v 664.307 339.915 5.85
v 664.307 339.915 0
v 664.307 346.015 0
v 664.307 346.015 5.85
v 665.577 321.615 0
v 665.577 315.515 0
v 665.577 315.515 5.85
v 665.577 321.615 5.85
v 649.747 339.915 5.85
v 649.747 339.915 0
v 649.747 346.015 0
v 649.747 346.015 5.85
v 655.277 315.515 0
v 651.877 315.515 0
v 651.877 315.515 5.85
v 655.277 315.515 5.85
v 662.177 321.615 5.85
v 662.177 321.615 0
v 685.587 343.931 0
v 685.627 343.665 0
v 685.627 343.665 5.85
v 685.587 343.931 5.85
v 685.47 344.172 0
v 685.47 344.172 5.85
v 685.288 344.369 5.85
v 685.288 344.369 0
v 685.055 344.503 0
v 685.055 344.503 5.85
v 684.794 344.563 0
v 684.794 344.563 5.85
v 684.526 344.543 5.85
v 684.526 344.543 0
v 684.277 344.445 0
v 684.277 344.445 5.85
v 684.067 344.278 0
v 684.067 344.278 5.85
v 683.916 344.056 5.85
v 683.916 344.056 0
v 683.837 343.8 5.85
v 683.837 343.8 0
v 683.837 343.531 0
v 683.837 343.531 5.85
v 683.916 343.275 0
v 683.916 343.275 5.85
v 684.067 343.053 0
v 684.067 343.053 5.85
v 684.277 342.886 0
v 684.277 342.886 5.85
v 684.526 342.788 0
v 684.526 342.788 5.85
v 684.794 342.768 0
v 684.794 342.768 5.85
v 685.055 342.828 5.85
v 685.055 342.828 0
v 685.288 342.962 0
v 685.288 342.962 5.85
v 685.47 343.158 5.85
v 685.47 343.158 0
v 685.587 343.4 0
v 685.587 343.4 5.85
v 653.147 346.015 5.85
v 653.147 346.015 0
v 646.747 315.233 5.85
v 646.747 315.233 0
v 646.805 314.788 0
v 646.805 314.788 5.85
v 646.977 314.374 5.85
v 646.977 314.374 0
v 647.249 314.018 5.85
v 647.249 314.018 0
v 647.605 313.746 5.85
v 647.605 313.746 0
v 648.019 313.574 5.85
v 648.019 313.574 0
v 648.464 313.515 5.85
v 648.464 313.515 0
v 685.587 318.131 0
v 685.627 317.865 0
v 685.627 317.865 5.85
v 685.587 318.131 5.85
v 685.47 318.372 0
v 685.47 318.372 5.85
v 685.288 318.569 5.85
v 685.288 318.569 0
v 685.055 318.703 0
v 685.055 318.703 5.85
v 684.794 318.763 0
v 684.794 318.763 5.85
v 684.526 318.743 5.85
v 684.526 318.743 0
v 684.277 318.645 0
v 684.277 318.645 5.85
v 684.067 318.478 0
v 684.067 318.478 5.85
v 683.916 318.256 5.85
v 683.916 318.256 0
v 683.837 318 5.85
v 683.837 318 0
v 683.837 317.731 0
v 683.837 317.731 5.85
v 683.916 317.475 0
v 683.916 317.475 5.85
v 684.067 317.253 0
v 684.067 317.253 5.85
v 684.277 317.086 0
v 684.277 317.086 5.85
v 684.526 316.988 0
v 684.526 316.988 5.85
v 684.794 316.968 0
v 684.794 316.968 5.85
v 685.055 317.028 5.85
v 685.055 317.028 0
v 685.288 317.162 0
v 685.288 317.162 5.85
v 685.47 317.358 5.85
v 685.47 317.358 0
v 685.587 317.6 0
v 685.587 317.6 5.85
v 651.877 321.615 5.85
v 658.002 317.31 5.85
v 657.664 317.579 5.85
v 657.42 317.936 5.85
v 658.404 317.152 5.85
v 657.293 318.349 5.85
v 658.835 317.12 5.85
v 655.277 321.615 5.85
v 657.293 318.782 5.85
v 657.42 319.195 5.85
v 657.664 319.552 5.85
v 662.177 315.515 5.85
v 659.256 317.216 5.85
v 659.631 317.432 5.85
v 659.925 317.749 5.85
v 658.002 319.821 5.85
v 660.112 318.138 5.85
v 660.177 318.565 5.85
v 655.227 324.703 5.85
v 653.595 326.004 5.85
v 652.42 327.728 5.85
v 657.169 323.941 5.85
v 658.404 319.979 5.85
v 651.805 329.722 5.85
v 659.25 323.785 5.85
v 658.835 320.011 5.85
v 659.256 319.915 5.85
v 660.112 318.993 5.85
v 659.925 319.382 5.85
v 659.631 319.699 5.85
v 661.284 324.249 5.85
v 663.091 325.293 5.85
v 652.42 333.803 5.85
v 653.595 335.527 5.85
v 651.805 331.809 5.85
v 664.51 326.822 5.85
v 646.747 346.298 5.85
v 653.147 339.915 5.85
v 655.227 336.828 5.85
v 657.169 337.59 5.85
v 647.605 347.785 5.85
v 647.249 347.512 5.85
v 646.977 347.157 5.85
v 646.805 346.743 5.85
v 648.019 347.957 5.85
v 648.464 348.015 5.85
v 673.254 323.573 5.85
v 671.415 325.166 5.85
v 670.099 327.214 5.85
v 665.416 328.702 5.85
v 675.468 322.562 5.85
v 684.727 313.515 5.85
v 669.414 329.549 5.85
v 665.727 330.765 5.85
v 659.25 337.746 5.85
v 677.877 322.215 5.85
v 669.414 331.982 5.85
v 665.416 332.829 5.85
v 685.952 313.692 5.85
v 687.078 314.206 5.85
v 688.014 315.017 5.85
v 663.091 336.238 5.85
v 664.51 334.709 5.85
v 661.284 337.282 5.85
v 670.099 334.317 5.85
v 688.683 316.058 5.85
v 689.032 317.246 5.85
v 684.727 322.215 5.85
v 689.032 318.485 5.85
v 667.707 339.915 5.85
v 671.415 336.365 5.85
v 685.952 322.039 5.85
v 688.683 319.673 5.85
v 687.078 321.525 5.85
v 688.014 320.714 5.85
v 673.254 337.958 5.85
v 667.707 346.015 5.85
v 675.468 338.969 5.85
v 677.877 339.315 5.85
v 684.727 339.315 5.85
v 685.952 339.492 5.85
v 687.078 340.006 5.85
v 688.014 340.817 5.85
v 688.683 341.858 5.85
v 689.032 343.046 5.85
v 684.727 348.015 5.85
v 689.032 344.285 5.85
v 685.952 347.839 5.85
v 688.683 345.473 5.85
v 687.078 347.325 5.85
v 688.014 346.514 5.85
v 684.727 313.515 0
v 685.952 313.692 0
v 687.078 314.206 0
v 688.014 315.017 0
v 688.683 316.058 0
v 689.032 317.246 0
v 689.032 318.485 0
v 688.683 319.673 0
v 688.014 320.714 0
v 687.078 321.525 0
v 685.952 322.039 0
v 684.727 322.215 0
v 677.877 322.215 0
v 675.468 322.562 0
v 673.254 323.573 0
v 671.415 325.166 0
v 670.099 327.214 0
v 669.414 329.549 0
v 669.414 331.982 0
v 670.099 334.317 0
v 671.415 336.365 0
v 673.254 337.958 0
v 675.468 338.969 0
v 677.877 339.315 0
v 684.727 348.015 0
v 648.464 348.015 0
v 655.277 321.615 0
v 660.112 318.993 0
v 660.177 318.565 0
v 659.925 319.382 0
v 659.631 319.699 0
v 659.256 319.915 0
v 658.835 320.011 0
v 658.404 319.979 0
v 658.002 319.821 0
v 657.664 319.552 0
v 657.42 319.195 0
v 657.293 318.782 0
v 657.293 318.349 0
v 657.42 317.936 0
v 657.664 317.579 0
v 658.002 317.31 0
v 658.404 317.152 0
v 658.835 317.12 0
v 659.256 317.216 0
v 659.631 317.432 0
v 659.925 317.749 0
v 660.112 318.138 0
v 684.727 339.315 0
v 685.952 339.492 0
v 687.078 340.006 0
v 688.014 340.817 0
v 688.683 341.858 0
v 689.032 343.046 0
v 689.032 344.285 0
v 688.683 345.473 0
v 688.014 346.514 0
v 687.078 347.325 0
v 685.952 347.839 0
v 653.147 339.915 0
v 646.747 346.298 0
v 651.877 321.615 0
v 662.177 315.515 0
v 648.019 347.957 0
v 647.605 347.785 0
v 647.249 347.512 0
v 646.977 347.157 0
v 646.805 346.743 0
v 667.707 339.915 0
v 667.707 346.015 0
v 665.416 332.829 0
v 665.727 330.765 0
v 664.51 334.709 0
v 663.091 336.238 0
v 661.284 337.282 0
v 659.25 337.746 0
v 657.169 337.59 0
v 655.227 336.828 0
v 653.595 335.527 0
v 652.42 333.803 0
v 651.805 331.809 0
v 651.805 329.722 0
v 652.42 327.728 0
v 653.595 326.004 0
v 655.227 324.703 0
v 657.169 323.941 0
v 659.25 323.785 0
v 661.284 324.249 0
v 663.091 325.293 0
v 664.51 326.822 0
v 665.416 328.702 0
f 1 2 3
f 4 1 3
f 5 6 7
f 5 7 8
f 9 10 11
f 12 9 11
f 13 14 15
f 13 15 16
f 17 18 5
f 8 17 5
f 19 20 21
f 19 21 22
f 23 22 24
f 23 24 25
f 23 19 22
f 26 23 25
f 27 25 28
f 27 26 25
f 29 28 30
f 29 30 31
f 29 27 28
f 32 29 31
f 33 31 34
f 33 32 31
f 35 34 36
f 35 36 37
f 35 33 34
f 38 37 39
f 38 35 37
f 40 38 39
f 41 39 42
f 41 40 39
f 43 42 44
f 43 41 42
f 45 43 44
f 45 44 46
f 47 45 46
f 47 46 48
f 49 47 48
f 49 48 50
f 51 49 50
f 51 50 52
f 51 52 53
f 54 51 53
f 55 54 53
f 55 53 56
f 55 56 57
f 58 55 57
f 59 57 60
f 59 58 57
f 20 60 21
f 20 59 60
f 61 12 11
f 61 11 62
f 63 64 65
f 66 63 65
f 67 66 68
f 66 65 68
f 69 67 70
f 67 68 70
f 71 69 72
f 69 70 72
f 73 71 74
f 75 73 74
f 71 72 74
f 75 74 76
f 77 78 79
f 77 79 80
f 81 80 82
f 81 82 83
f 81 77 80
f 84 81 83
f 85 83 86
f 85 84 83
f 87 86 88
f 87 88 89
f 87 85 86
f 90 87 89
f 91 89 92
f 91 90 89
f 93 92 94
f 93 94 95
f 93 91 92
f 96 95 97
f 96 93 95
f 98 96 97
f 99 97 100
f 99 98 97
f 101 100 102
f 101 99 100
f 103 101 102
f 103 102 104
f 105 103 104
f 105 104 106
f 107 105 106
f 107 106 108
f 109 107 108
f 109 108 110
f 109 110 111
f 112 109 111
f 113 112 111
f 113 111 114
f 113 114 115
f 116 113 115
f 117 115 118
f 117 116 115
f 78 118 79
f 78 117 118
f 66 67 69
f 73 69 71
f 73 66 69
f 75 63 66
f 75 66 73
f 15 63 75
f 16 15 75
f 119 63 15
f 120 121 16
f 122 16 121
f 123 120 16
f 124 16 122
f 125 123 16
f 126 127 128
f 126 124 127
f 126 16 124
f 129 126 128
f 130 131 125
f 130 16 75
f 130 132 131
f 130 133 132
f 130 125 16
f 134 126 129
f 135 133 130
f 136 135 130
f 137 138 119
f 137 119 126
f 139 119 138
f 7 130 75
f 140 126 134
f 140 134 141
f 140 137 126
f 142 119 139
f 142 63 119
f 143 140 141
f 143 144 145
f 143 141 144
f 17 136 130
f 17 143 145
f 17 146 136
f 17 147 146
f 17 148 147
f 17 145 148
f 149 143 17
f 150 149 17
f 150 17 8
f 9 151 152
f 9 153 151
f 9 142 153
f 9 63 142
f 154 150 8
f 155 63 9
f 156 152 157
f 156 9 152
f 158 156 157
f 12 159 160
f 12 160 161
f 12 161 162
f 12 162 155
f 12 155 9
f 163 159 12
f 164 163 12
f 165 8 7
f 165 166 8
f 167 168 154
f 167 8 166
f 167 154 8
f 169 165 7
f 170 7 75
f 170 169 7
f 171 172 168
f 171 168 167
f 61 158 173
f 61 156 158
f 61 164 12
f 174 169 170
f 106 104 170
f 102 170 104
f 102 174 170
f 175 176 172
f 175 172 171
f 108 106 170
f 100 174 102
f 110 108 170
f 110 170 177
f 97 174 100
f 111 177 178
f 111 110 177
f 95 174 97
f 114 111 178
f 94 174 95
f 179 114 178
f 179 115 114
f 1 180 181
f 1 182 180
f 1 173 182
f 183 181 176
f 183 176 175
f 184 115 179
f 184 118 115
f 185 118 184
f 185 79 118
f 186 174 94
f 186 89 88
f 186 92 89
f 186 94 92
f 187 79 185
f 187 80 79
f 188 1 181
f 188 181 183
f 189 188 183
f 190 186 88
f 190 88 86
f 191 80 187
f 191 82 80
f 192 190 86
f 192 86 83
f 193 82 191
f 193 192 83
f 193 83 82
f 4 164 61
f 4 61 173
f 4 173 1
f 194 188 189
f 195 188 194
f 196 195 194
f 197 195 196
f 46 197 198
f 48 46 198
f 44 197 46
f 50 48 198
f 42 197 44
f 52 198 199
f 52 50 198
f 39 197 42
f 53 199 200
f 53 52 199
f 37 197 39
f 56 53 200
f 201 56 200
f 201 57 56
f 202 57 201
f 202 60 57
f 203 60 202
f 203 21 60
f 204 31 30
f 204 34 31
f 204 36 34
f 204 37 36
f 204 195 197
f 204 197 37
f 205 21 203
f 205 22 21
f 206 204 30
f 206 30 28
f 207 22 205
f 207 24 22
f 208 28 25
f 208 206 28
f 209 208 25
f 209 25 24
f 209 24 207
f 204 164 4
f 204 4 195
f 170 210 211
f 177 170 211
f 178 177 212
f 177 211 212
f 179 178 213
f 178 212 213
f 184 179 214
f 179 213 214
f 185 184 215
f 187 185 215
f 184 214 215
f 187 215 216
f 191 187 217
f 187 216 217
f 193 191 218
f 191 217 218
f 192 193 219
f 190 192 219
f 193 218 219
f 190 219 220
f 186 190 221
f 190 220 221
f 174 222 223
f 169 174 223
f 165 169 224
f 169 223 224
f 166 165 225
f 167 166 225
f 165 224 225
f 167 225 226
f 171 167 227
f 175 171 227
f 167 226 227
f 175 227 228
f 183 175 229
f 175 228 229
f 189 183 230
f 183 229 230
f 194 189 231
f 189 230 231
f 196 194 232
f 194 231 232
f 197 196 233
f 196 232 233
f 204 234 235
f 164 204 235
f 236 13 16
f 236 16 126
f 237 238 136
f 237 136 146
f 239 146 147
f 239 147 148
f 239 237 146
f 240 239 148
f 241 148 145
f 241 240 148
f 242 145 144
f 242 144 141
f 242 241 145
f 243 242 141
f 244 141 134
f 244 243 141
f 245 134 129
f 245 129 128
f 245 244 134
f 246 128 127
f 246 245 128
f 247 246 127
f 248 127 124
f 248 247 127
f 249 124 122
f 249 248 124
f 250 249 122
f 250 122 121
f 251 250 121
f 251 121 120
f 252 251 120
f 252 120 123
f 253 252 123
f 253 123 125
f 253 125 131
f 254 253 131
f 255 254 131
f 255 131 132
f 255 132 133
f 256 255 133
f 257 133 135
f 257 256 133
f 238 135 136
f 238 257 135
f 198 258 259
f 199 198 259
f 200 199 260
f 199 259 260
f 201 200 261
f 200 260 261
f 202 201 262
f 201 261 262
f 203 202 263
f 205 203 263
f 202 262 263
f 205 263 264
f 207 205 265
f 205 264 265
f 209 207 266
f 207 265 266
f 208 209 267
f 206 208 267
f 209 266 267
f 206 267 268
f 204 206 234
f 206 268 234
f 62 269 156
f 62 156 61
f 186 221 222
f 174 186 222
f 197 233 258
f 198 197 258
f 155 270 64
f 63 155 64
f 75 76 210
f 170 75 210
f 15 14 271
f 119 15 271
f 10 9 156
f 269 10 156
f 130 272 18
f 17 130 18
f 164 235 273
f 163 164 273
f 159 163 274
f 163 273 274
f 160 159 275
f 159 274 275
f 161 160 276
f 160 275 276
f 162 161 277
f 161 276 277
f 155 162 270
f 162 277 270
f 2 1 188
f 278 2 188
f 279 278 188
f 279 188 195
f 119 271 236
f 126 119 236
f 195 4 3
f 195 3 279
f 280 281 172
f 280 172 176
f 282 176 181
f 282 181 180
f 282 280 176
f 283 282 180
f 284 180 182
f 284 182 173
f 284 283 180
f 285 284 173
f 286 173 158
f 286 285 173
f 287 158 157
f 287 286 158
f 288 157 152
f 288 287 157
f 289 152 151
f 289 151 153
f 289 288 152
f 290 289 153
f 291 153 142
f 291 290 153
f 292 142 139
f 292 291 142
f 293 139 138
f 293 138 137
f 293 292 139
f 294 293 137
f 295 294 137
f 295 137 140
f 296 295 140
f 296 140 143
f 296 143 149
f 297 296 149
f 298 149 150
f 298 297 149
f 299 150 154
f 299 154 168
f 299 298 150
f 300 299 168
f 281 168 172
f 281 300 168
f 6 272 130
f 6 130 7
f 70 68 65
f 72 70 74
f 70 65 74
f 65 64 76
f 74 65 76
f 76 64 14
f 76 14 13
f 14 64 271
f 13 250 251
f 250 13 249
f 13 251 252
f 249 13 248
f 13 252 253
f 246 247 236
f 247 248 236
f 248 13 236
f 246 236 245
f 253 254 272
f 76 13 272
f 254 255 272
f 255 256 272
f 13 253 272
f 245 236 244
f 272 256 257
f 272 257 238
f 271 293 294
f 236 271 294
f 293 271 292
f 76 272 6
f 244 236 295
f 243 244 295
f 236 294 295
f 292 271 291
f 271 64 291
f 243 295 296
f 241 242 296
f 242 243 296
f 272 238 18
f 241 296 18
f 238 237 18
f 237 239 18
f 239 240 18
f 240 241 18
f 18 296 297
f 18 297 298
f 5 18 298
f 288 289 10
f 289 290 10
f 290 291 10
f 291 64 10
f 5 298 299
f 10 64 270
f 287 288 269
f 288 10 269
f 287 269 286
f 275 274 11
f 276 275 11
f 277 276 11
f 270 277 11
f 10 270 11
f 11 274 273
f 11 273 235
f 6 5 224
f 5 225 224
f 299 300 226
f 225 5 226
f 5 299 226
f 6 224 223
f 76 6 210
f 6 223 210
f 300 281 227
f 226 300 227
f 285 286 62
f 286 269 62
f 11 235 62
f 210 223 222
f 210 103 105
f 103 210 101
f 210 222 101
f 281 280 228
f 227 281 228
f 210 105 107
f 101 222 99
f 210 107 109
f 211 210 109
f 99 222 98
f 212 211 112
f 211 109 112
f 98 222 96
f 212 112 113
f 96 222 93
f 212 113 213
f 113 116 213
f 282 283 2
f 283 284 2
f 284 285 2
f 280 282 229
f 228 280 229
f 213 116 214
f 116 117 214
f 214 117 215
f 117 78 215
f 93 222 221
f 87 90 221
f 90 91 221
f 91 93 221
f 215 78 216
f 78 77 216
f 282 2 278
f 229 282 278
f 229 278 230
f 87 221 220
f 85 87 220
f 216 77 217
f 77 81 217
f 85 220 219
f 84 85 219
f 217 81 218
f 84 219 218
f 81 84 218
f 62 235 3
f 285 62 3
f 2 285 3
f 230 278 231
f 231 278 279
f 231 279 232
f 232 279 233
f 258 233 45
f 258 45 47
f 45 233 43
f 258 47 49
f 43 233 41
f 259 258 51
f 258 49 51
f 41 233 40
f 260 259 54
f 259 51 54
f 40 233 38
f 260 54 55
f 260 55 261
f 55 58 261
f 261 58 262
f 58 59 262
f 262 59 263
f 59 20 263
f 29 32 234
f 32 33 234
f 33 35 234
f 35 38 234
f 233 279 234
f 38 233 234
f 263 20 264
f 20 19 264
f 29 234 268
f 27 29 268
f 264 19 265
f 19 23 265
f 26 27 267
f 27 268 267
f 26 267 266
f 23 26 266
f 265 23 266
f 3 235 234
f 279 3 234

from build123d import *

# Parameters (mm, degrees)
SKETCH1_R           = 0.9
SKETCH1_R_2         = 1.45
SKETCH1_R_3         = 7
SKETCH1_W           = 3.400011
SKETCH1_H           = 6.1
SKETCH1_W_2         = 3.4
BOSS_EXTRUDE2_DEPTH = 5.85


with BuildPart() as part:
    # Sketch1 → Boss-Extrude2 (new body)
    with BuildSketch(Plane.XY):
        with BuildLine():
            Line((669.21684417, 348.01545661), (648.4638119, 348.01545661))
            ThreePointArc((648.4638119, 348.01545661), (647.249496344, 347.512470637), (646.746510371, 346.298155081))
            Line((646.746510371, 346.298155081), (646.746510371, 315.232758138))
            ThreePointArc((646.746510371, 315.232758138), (647.249496344, 314.018442582), (648.4638119, 313.51545661))
            Line((648.4638119, 313.51545661), (669.21684417, 313.51545661))
            Line((669.21684417, 313.51545661), (684.726521371, 313.51545661))
            ThreePointArc((684.726521371, 313.51545661), (689.076521371, 317.86545661), (684.726521371, 322.21545661))
            Line((684.726521371, 322.21545661), (677.876521371, 322.21545661))
            ThreePointArc((677.876521371, 322.21545661), (669.326521371, 330.76545661), (677.876521371, 339.31545661))
            Line((677.876521371, 339.31545661), (684.726521371, 339.31545661))
            ThreePointArc((684.726521371, 339.31545661), (689.076521371, 343.66545661), (684.726521371, 348.01545661))
            Line((684.726521371, 348.01545661), (669.21684417, 348.01545661))
        make_face()
        with Locations((684.726521371, 343.66545661)):
            Circle(SKETCH1_R, mode=Mode.SUBTRACT)
        with Locations((684.726521371, 317.86545661)):
            Circle(SKETCH1_R, mode=Mode.SUBTRACT)
        with Locations((658.726521371, 318.56545661)):
            Circle(SKETCH1_R_2, mode=Mode.SUBTRACT)
        with Locations((658.726521371, 330.76545661)):
            Circle(SKETCH1_R_3, mode=Mode.SUBTRACT)
        with Locations((651.446515871, 342.96545661)):
            Rectangle(SKETCH1_W, SKETCH1_H, mode=Mode.SUBTRACT)
        with Locations((653.576521371, 318.56545661)):
            Rectangle(SKETCH1_W_2, SKETCH1_H, mode=Mode.SUBTRACT)
        with Locations((666.006526871, 342.96545661)):
            Rectangle(SKETCH1_W, SKETCH1_H, mode=Mode.SUBTRACT)
        with Locations((663.876521371, 318.56545661)):
            Rectangle(SKETCH1_W_2, SKETCH1_H, mode=Mode.SUBTRACT)
    extrude(amount=BOSS_EXTRUDE2_DEPTH)


solid = part.part
